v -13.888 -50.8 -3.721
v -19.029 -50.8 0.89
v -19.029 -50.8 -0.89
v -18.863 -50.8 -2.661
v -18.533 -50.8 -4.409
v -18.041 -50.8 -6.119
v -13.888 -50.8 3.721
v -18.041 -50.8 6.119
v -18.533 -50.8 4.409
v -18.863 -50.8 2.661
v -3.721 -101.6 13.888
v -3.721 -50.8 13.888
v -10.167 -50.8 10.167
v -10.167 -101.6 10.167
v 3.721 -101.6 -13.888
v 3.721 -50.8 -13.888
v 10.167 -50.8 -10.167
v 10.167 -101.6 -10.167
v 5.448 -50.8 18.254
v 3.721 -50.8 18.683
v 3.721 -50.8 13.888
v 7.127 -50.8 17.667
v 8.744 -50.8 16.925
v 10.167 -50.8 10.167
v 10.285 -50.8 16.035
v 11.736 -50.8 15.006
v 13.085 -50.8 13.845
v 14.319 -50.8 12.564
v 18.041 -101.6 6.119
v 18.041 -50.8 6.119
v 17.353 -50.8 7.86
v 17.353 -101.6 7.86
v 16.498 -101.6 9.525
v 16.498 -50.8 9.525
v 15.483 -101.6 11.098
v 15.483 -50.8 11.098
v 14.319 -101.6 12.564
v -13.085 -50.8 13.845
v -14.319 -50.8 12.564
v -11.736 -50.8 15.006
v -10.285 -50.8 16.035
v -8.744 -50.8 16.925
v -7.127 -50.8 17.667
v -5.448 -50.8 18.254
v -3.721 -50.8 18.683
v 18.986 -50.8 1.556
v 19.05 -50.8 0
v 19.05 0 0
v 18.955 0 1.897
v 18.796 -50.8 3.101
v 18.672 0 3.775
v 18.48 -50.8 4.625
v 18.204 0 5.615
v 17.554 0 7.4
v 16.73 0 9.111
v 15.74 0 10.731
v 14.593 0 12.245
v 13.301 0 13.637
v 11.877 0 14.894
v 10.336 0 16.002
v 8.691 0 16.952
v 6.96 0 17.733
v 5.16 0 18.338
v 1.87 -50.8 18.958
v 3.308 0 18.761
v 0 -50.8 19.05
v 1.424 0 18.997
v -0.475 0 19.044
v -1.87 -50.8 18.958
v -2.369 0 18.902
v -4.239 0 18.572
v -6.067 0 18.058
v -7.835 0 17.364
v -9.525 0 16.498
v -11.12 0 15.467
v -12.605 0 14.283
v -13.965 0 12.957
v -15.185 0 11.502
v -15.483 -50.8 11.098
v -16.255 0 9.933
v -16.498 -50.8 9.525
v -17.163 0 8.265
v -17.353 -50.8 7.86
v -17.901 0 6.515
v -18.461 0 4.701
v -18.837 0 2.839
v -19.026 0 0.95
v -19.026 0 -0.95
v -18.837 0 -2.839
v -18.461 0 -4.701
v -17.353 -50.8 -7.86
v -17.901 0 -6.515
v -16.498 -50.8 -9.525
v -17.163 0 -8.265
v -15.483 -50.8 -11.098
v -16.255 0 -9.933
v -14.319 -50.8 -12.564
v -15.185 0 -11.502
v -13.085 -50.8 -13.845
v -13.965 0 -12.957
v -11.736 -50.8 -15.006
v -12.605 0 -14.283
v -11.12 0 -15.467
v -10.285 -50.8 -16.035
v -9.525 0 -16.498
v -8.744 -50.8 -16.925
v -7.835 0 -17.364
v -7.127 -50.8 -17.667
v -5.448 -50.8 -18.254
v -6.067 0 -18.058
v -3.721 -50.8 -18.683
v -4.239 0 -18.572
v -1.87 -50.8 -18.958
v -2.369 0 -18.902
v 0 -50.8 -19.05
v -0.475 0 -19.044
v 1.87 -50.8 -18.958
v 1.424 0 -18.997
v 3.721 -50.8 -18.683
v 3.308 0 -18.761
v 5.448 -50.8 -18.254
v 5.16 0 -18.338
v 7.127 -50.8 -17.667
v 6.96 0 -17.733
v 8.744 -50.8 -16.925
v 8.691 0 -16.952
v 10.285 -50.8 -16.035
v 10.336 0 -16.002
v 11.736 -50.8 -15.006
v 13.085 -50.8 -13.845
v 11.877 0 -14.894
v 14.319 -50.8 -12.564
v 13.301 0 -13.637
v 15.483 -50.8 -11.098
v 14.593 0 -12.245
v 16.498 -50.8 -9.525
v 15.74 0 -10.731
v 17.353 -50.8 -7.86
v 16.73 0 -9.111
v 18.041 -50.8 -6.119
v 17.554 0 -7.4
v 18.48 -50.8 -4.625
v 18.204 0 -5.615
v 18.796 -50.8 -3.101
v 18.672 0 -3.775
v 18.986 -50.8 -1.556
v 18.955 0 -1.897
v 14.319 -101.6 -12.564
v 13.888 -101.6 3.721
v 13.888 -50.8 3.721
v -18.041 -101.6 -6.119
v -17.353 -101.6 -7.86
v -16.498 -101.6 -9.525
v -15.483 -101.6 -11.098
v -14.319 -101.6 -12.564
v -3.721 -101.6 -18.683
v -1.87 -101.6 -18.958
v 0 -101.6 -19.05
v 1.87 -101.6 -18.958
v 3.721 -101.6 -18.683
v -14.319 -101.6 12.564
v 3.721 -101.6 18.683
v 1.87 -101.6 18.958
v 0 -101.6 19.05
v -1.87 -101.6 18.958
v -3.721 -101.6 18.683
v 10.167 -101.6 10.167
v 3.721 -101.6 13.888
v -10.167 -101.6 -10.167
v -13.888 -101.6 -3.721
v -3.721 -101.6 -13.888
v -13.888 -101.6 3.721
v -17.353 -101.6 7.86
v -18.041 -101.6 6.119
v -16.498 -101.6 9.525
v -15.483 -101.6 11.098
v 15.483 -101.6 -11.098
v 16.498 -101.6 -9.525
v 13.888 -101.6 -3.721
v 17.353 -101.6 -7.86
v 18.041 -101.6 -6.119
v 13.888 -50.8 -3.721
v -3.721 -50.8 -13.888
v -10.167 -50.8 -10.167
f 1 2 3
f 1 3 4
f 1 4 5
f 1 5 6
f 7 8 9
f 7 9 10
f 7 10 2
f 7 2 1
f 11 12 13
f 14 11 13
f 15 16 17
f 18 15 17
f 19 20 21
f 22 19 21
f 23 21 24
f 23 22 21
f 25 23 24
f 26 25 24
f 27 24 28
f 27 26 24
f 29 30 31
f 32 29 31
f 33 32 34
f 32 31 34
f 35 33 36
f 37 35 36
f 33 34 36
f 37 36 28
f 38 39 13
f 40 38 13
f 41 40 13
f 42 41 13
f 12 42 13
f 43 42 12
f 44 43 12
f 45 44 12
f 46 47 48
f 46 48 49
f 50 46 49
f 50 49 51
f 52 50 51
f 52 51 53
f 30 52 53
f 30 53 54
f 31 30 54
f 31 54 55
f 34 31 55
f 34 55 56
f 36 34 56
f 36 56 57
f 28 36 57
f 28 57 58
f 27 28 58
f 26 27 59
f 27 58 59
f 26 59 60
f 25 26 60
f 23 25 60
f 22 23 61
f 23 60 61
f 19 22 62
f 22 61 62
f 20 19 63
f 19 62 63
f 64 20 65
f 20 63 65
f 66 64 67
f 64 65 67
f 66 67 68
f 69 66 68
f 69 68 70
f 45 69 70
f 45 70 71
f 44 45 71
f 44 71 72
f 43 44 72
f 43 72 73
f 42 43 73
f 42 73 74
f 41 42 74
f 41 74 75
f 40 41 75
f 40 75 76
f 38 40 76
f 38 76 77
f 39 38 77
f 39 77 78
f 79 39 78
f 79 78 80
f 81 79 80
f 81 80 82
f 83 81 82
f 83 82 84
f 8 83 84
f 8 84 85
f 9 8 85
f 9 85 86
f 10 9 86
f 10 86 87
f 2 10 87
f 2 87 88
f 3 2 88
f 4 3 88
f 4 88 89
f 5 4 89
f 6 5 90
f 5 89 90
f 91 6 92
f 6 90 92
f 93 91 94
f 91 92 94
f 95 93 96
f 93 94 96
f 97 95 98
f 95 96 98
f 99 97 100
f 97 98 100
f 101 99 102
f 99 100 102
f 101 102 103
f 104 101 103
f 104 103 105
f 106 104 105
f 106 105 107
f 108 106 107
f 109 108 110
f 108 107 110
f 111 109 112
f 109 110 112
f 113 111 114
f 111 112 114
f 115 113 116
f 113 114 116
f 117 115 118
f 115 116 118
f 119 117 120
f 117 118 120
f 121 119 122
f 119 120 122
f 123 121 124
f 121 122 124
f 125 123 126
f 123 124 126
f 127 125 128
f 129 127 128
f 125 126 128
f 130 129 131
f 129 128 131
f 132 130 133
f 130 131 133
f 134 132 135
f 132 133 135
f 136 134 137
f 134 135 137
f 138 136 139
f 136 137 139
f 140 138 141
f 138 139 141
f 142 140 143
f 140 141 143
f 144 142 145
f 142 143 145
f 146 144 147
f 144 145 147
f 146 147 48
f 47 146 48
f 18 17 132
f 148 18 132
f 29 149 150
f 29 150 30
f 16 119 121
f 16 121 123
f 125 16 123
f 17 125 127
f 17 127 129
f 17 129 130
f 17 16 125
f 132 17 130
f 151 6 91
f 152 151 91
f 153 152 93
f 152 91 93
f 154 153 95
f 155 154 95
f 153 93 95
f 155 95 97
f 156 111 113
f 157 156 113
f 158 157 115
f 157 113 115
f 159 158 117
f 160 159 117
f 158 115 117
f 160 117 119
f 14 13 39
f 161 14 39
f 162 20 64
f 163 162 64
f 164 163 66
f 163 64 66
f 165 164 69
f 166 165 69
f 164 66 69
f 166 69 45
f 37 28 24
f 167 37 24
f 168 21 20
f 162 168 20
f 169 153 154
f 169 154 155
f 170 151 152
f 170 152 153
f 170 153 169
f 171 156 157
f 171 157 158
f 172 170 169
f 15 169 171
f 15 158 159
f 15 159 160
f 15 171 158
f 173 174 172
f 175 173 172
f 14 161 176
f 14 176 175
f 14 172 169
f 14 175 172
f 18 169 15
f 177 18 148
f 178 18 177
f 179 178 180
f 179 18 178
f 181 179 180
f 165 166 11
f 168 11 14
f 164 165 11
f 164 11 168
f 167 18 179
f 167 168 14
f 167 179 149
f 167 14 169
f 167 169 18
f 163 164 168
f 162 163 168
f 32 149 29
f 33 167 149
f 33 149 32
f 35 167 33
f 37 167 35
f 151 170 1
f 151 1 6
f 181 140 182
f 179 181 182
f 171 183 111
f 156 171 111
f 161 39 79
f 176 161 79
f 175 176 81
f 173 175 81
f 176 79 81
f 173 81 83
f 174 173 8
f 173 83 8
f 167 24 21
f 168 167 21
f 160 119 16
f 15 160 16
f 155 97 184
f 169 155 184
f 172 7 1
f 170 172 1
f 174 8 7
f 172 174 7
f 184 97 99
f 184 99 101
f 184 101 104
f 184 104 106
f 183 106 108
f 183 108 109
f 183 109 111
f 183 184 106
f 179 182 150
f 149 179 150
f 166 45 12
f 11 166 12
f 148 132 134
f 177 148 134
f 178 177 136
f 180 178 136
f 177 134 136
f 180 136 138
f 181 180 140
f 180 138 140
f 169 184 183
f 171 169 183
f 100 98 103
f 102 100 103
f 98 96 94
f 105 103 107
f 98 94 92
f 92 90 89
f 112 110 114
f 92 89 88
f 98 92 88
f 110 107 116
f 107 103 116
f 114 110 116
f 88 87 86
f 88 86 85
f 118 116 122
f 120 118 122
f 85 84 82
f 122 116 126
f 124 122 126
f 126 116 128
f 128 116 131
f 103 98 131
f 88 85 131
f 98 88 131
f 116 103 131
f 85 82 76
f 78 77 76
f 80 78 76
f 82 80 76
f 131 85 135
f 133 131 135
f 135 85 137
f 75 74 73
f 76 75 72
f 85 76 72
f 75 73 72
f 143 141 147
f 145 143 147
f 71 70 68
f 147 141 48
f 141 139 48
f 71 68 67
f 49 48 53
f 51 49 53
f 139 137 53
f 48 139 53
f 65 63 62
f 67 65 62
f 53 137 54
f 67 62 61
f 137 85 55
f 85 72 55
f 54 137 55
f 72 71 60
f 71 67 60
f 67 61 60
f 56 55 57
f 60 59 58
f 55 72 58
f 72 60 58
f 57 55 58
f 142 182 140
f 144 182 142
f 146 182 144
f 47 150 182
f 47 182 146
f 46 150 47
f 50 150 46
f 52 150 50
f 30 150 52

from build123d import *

# Parameters (mm, degrees)
F0_R     = 19.05
F1_DEPTH = 50.8
F3_DEPTH = 50.8


with BuildPart() as f1:
    # F0 (on Front) → F1 (new body)
    with BuildSketch(Plane.XZ):
        Circle(F0_R)
    extrude(amount=F1_DEPTH)

    # F2 (on face) → F3 (join)
    with BuildSketch(Plane.XZ.offset(50.8)):
        with BuildLine():
            Line((-18.040595, 6.118777), (-13.888012, 3.721282))
            Line((-13.888012, 3.721282), (-10.16673, 10.16673))
            Line((-10.16673, 10.16673), (-14.319314, 12.564225))
            ThreePointArc((-14.319314, 12.564225), (-16.497784, 9.525), (-18.040595, 6.118777))
        make_face()
        with BuildLine():
            Line((-3.721282, 13.888012), (3.721282, 13.888012))
            Line((3.721282, 13.888012), (3.721282, 18.683002))
            ThreePointArc((3.721282, 18.683002), (0, 19.05), (-3.721282, 18.683002))
            Line((-3.721282, 18.683002), (-3.721282, 13.888012))
        make_face()
        with BuildLine():
            Line((10.16673, 10.16673), (13.888012, 3.721282))
            Line((13.888012, 3.721282), (18.040595, 6.118777))
            ThreePointArc((18.040595, 6.118777), (16.497784, 9.525), (14.319314, 12.564225))
            Line((14.319314, 12.564225), (10.16673, 10.16673))
        make_face()
        with BuildLine():
            Line((13.888012, -3.721282), (10.16673, -10.16673))
            Line((10.16673, -10.16673), (14.319314, -12.564225))
            ThreePointArc((14.319314, -12.564225), (16.497784, -9.525), (18.040595, -6.118777))
            Line((18.040595, -6.118777), (13.888012, -3.721282))
        make_face()
        with BuildLine():
            Line((3.721282, -18.683002), (3.721282, -13.888012))
            Line((3.721282, -13.888012), (-3.721282, -13.888012))
            Line((-3.721282, -13.888012), (-3.721282, -18.683002))
            ThreePointArc((-3.721282, -18.683002), (0, -19.05), (3.721282, -18.683002))
        make_face()
        with BuildLine():
            Line((-14.319314, -12.564225), (-10.16673, -10.16673))
            Line((-10.16673, -10.16673), (-13.888012, -3.721282))
            Line((-13.888012, -3.721282), (-18.040595, -6.118777))
            ThreePointArc((-18.040595, -6.118777), (-16.497784, -9.525), (-14.319314, -12.564225))
        make_face()
        Polygon((3.721282, -13.888012), (10.16673, -10.16673), (13.888012, -3.721282), (13.888012, 3.721282), (10.16673, 10.16673), (3.721282, 13.888012), (-3.721282, 13.888012), (-10.16673, 10.16673), (-13.888012, 3.721282), (-13.888012, -3.721282), (-10.16673, -10.16673), (-3.721282, -13.888012), align=None)
    extrude(amount=F3_DEPTH)


solid = f1.part
